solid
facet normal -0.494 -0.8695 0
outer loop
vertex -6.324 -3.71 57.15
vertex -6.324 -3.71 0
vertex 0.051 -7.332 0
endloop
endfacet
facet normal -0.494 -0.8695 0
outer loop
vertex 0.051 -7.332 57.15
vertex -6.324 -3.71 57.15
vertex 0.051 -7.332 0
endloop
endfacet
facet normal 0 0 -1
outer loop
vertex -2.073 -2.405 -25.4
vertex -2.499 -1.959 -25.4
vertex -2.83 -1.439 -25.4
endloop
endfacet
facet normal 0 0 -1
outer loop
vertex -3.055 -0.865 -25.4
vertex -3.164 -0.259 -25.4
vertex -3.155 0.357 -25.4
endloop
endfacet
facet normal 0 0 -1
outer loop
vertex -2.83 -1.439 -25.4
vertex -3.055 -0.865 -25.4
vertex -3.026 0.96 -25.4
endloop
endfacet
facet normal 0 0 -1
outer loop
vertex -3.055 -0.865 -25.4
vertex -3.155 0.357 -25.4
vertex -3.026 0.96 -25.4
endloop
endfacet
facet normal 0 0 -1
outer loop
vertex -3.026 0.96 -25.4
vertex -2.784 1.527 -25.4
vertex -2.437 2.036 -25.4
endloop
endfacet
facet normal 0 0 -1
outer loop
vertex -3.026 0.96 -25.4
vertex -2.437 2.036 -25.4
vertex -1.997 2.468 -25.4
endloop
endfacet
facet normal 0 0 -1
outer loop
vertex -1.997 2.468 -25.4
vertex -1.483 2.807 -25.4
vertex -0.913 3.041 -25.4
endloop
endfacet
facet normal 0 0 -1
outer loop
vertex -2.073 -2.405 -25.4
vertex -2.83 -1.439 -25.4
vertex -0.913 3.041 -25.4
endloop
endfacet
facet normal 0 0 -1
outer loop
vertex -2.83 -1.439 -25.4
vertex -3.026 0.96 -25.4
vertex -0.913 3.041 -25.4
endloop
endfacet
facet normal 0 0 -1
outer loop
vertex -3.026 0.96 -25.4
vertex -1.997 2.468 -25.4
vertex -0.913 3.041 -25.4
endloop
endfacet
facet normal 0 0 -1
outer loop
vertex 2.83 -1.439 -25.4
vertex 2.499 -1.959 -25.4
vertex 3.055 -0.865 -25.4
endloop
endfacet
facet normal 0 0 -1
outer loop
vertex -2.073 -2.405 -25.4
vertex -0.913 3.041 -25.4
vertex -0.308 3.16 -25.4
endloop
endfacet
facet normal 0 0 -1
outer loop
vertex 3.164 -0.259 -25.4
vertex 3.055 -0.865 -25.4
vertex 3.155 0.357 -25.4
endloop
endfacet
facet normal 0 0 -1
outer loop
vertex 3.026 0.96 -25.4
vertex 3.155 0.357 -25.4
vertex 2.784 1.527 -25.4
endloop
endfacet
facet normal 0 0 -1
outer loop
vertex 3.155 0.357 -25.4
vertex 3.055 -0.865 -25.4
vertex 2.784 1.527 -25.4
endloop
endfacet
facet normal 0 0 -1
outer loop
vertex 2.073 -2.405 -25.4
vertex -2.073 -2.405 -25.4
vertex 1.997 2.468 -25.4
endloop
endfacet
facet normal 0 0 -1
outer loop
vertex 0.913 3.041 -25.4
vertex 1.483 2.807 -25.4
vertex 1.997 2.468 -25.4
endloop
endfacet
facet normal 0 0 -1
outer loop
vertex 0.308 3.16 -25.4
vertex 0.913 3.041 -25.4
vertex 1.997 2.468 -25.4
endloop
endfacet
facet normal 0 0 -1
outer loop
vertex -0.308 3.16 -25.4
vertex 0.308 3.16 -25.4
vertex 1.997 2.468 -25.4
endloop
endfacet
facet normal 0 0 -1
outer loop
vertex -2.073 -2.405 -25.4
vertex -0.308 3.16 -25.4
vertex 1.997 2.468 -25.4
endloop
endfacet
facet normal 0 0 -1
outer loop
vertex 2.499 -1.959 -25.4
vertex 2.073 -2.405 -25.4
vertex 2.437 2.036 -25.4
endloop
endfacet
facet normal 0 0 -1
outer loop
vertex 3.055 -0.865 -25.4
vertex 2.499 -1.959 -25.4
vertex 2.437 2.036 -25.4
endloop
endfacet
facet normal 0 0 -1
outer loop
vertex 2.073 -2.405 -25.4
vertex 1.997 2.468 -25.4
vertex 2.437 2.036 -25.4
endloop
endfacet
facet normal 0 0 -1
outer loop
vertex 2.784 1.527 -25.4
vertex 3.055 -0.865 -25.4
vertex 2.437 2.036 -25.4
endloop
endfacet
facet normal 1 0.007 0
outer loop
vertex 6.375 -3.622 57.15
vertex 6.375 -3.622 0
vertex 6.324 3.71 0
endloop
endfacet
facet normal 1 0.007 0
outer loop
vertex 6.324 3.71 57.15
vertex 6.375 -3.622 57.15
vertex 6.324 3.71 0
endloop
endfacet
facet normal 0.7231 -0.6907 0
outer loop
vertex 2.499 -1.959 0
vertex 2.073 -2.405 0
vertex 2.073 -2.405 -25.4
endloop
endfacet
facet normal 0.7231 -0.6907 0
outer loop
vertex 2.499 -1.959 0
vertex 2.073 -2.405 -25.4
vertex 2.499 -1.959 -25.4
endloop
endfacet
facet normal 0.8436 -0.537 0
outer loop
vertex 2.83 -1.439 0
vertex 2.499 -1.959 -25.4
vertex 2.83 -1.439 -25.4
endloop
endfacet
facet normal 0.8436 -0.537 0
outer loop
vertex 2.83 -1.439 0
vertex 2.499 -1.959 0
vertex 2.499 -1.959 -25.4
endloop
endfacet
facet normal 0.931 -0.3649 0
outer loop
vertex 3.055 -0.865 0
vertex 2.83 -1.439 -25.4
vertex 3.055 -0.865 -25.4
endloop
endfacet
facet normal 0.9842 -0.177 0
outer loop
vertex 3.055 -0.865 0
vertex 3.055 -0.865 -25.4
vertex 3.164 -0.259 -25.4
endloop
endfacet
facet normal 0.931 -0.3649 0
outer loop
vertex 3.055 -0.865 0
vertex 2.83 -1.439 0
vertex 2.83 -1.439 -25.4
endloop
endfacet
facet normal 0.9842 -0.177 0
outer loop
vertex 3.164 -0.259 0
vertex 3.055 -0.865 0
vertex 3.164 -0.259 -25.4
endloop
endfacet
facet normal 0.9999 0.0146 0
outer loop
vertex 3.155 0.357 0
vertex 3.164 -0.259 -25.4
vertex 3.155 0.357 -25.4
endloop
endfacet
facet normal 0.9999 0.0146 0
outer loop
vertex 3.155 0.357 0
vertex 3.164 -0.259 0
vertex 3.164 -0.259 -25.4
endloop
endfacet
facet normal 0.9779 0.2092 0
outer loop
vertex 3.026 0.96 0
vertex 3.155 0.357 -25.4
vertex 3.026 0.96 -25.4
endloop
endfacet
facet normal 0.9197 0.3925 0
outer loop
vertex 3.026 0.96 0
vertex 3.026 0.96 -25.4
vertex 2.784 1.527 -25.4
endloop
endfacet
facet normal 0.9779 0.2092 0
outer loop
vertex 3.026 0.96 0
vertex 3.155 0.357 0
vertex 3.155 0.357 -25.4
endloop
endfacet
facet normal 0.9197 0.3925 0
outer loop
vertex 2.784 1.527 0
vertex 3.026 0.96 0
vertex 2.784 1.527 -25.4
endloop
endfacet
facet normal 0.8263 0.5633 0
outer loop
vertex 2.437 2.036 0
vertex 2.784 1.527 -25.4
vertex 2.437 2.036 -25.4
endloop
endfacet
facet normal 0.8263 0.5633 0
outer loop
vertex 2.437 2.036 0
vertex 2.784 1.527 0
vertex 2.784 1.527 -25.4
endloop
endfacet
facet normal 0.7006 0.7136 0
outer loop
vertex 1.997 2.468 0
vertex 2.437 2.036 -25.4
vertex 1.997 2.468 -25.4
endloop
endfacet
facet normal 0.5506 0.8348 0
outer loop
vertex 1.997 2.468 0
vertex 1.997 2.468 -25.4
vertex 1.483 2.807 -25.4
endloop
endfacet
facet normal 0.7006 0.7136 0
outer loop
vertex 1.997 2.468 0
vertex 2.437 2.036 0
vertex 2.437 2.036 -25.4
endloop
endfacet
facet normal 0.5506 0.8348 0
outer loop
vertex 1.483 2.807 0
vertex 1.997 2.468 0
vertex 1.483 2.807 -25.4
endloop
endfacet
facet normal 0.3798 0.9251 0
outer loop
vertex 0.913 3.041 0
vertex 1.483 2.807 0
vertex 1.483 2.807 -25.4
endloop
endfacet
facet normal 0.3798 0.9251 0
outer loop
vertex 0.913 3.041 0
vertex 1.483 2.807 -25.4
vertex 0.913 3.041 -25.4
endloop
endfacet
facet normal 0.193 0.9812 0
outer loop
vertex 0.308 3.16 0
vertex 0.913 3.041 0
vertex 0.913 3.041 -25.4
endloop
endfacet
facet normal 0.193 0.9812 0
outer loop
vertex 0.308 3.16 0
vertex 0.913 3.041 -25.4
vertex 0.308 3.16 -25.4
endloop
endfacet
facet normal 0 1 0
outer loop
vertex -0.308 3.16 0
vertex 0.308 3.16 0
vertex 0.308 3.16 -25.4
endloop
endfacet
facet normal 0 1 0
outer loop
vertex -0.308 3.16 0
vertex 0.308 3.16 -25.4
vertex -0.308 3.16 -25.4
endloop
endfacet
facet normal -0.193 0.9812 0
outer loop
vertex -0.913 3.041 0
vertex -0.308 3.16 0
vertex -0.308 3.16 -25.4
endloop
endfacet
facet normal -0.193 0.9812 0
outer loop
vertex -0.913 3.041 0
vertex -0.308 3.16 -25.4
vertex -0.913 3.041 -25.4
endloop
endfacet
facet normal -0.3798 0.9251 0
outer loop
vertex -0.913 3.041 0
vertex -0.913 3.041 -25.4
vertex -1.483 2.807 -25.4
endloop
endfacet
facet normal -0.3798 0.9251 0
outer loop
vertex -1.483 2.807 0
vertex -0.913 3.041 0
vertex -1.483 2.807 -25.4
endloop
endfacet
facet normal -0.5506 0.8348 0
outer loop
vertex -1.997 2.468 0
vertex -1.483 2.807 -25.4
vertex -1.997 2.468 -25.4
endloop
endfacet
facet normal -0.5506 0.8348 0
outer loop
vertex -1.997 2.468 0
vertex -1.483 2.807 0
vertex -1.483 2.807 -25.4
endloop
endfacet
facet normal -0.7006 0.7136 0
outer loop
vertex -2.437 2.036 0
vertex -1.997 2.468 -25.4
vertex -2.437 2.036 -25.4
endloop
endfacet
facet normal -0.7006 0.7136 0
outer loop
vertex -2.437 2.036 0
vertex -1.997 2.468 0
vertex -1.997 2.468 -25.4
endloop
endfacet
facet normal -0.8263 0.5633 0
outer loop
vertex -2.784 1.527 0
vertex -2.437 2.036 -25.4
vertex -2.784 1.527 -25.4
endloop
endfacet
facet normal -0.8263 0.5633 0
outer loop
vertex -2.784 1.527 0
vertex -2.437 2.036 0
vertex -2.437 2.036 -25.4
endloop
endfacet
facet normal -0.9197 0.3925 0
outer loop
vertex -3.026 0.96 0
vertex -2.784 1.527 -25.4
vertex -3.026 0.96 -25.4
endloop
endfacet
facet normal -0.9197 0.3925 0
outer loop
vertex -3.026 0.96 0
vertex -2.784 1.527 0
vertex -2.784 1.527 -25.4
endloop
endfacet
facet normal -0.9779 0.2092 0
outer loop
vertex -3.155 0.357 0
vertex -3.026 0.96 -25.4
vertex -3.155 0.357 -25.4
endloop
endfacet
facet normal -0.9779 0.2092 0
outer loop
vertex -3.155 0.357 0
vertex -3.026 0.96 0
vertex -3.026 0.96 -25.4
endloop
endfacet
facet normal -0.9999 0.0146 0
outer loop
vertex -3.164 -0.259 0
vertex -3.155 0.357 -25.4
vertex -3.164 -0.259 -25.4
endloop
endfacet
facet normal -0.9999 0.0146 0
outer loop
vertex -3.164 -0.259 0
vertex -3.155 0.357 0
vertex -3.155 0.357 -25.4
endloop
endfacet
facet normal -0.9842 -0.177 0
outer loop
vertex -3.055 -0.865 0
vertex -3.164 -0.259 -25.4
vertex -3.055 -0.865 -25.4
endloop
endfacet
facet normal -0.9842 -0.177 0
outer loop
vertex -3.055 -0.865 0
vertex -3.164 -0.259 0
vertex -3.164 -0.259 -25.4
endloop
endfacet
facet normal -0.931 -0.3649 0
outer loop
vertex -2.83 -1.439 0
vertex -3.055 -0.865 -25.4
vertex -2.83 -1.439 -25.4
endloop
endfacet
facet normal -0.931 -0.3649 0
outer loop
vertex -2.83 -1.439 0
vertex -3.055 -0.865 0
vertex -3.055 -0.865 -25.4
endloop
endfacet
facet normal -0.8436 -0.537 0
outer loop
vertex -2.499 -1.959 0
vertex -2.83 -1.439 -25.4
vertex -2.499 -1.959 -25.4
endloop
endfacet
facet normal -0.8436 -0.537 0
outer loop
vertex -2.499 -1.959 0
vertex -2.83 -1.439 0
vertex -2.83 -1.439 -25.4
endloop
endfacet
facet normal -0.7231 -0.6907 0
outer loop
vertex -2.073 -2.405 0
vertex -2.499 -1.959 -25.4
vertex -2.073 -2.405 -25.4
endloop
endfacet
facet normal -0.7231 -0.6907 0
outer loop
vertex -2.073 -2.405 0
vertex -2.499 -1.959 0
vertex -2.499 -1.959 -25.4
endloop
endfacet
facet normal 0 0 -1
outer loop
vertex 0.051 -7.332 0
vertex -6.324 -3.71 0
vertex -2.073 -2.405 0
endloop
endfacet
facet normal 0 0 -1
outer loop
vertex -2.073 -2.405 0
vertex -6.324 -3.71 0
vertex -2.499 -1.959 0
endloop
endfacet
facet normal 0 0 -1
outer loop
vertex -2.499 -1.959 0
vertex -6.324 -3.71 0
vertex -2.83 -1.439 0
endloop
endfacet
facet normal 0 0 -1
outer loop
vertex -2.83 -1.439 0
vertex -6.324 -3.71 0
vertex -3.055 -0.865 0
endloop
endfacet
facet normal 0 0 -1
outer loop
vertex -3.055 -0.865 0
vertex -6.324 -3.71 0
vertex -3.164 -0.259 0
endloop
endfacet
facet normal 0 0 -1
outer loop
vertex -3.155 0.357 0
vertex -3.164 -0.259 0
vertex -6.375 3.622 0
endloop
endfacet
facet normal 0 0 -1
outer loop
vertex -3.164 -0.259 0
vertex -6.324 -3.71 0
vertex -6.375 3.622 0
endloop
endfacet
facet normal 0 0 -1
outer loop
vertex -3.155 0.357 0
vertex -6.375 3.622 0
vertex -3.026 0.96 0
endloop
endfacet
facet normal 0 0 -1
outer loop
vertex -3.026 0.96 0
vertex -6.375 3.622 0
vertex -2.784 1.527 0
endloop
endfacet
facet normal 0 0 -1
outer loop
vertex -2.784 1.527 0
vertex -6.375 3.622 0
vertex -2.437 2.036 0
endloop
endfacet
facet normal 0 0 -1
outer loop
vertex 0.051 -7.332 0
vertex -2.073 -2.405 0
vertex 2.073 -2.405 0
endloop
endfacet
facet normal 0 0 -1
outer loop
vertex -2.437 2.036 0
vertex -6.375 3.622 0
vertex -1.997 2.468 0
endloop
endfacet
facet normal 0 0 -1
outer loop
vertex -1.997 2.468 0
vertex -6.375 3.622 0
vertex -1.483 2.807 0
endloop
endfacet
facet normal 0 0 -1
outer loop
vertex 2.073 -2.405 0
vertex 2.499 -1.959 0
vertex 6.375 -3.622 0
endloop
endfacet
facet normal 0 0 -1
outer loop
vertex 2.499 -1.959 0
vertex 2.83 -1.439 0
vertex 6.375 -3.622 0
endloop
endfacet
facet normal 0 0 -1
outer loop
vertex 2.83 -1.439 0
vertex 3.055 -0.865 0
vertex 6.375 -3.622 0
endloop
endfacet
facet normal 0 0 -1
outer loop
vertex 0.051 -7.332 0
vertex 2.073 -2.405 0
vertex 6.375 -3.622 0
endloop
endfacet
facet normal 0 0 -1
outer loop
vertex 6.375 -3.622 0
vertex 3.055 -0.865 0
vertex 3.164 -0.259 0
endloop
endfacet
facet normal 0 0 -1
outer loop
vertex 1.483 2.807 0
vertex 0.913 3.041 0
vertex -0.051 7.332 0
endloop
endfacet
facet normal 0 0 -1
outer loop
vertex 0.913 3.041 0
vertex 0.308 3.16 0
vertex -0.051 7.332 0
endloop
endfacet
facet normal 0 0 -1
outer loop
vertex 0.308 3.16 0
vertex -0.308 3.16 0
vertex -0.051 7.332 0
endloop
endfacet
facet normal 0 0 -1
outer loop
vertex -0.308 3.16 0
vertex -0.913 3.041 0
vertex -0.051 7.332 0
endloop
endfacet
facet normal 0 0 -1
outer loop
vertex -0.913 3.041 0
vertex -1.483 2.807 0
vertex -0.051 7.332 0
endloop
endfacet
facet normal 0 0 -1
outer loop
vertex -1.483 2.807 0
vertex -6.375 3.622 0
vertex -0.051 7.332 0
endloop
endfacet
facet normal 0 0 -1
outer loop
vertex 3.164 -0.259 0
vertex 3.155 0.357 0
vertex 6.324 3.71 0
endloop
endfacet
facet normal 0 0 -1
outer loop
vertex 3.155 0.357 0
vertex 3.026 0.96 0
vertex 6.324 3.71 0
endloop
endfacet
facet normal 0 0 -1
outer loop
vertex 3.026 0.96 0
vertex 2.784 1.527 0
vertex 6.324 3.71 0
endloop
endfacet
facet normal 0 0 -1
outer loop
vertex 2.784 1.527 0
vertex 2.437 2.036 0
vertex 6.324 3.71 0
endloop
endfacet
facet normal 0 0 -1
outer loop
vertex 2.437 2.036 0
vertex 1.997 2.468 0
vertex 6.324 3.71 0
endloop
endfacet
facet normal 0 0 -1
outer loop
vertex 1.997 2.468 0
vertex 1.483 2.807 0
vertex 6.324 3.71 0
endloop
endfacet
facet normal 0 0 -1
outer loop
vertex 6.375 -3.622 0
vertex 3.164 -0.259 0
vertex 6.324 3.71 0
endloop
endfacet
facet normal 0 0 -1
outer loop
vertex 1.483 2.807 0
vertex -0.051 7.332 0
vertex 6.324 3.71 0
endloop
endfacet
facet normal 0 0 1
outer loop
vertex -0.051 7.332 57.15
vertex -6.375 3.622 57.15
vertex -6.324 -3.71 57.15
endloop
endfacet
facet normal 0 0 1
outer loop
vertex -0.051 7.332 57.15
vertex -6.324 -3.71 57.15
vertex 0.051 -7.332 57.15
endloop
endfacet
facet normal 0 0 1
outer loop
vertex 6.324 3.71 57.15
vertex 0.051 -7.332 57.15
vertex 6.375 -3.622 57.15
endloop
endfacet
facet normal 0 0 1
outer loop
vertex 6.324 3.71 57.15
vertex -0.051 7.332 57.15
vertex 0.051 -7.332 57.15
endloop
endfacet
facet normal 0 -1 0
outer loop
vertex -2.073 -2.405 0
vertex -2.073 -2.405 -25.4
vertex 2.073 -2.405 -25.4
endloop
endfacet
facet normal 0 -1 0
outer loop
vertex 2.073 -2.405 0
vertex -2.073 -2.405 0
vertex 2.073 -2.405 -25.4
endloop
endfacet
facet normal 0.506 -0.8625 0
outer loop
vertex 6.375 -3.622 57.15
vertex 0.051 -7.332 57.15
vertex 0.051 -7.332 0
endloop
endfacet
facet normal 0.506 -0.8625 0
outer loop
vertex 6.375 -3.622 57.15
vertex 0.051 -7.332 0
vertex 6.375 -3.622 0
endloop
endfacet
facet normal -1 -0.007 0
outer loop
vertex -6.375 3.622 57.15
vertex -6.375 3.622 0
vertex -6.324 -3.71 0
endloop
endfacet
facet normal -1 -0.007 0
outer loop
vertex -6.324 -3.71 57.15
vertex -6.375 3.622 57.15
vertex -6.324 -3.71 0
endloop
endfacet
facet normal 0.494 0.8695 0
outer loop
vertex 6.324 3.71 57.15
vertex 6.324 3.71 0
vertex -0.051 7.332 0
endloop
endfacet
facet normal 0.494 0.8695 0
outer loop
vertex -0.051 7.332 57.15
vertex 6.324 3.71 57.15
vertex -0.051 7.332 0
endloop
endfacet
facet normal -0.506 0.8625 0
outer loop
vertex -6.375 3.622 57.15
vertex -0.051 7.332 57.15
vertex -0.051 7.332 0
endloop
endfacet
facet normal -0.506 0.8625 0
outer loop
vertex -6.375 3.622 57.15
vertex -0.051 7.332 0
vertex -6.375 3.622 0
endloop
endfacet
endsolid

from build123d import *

# Parameters (mm, degrees)
F1_DEPTH = 57.15
F3_DEPTH = 25.4


with BuildPart() as f1:
    # F0 (on Top) → F1 (new body)
    with BuildSketch(Plane.XY):
        Polygon((0.051027, -7.332171), (6.37536, -3.621895), (6.324333, 3.710276), (-0.051027, 7.332171), (-6.37536, 3.621895), (-6.324333, -3.710276), align=None)
    extrude(amount=F1_DEPTH)

    # F2 (on Top) → F3 (join)
    with BuildSketch(Plane.XY):
        with BuildLine():
            Line((-2.073388, -2.404514), (2.073388, -2.404514))
            ThreePointArc((2.073388, -2.404514), (0, 3.175), (-2.073388, -2.404514))
        make_face()
    extrude(amount=-F3_DEPTH)


solid = f1.part
